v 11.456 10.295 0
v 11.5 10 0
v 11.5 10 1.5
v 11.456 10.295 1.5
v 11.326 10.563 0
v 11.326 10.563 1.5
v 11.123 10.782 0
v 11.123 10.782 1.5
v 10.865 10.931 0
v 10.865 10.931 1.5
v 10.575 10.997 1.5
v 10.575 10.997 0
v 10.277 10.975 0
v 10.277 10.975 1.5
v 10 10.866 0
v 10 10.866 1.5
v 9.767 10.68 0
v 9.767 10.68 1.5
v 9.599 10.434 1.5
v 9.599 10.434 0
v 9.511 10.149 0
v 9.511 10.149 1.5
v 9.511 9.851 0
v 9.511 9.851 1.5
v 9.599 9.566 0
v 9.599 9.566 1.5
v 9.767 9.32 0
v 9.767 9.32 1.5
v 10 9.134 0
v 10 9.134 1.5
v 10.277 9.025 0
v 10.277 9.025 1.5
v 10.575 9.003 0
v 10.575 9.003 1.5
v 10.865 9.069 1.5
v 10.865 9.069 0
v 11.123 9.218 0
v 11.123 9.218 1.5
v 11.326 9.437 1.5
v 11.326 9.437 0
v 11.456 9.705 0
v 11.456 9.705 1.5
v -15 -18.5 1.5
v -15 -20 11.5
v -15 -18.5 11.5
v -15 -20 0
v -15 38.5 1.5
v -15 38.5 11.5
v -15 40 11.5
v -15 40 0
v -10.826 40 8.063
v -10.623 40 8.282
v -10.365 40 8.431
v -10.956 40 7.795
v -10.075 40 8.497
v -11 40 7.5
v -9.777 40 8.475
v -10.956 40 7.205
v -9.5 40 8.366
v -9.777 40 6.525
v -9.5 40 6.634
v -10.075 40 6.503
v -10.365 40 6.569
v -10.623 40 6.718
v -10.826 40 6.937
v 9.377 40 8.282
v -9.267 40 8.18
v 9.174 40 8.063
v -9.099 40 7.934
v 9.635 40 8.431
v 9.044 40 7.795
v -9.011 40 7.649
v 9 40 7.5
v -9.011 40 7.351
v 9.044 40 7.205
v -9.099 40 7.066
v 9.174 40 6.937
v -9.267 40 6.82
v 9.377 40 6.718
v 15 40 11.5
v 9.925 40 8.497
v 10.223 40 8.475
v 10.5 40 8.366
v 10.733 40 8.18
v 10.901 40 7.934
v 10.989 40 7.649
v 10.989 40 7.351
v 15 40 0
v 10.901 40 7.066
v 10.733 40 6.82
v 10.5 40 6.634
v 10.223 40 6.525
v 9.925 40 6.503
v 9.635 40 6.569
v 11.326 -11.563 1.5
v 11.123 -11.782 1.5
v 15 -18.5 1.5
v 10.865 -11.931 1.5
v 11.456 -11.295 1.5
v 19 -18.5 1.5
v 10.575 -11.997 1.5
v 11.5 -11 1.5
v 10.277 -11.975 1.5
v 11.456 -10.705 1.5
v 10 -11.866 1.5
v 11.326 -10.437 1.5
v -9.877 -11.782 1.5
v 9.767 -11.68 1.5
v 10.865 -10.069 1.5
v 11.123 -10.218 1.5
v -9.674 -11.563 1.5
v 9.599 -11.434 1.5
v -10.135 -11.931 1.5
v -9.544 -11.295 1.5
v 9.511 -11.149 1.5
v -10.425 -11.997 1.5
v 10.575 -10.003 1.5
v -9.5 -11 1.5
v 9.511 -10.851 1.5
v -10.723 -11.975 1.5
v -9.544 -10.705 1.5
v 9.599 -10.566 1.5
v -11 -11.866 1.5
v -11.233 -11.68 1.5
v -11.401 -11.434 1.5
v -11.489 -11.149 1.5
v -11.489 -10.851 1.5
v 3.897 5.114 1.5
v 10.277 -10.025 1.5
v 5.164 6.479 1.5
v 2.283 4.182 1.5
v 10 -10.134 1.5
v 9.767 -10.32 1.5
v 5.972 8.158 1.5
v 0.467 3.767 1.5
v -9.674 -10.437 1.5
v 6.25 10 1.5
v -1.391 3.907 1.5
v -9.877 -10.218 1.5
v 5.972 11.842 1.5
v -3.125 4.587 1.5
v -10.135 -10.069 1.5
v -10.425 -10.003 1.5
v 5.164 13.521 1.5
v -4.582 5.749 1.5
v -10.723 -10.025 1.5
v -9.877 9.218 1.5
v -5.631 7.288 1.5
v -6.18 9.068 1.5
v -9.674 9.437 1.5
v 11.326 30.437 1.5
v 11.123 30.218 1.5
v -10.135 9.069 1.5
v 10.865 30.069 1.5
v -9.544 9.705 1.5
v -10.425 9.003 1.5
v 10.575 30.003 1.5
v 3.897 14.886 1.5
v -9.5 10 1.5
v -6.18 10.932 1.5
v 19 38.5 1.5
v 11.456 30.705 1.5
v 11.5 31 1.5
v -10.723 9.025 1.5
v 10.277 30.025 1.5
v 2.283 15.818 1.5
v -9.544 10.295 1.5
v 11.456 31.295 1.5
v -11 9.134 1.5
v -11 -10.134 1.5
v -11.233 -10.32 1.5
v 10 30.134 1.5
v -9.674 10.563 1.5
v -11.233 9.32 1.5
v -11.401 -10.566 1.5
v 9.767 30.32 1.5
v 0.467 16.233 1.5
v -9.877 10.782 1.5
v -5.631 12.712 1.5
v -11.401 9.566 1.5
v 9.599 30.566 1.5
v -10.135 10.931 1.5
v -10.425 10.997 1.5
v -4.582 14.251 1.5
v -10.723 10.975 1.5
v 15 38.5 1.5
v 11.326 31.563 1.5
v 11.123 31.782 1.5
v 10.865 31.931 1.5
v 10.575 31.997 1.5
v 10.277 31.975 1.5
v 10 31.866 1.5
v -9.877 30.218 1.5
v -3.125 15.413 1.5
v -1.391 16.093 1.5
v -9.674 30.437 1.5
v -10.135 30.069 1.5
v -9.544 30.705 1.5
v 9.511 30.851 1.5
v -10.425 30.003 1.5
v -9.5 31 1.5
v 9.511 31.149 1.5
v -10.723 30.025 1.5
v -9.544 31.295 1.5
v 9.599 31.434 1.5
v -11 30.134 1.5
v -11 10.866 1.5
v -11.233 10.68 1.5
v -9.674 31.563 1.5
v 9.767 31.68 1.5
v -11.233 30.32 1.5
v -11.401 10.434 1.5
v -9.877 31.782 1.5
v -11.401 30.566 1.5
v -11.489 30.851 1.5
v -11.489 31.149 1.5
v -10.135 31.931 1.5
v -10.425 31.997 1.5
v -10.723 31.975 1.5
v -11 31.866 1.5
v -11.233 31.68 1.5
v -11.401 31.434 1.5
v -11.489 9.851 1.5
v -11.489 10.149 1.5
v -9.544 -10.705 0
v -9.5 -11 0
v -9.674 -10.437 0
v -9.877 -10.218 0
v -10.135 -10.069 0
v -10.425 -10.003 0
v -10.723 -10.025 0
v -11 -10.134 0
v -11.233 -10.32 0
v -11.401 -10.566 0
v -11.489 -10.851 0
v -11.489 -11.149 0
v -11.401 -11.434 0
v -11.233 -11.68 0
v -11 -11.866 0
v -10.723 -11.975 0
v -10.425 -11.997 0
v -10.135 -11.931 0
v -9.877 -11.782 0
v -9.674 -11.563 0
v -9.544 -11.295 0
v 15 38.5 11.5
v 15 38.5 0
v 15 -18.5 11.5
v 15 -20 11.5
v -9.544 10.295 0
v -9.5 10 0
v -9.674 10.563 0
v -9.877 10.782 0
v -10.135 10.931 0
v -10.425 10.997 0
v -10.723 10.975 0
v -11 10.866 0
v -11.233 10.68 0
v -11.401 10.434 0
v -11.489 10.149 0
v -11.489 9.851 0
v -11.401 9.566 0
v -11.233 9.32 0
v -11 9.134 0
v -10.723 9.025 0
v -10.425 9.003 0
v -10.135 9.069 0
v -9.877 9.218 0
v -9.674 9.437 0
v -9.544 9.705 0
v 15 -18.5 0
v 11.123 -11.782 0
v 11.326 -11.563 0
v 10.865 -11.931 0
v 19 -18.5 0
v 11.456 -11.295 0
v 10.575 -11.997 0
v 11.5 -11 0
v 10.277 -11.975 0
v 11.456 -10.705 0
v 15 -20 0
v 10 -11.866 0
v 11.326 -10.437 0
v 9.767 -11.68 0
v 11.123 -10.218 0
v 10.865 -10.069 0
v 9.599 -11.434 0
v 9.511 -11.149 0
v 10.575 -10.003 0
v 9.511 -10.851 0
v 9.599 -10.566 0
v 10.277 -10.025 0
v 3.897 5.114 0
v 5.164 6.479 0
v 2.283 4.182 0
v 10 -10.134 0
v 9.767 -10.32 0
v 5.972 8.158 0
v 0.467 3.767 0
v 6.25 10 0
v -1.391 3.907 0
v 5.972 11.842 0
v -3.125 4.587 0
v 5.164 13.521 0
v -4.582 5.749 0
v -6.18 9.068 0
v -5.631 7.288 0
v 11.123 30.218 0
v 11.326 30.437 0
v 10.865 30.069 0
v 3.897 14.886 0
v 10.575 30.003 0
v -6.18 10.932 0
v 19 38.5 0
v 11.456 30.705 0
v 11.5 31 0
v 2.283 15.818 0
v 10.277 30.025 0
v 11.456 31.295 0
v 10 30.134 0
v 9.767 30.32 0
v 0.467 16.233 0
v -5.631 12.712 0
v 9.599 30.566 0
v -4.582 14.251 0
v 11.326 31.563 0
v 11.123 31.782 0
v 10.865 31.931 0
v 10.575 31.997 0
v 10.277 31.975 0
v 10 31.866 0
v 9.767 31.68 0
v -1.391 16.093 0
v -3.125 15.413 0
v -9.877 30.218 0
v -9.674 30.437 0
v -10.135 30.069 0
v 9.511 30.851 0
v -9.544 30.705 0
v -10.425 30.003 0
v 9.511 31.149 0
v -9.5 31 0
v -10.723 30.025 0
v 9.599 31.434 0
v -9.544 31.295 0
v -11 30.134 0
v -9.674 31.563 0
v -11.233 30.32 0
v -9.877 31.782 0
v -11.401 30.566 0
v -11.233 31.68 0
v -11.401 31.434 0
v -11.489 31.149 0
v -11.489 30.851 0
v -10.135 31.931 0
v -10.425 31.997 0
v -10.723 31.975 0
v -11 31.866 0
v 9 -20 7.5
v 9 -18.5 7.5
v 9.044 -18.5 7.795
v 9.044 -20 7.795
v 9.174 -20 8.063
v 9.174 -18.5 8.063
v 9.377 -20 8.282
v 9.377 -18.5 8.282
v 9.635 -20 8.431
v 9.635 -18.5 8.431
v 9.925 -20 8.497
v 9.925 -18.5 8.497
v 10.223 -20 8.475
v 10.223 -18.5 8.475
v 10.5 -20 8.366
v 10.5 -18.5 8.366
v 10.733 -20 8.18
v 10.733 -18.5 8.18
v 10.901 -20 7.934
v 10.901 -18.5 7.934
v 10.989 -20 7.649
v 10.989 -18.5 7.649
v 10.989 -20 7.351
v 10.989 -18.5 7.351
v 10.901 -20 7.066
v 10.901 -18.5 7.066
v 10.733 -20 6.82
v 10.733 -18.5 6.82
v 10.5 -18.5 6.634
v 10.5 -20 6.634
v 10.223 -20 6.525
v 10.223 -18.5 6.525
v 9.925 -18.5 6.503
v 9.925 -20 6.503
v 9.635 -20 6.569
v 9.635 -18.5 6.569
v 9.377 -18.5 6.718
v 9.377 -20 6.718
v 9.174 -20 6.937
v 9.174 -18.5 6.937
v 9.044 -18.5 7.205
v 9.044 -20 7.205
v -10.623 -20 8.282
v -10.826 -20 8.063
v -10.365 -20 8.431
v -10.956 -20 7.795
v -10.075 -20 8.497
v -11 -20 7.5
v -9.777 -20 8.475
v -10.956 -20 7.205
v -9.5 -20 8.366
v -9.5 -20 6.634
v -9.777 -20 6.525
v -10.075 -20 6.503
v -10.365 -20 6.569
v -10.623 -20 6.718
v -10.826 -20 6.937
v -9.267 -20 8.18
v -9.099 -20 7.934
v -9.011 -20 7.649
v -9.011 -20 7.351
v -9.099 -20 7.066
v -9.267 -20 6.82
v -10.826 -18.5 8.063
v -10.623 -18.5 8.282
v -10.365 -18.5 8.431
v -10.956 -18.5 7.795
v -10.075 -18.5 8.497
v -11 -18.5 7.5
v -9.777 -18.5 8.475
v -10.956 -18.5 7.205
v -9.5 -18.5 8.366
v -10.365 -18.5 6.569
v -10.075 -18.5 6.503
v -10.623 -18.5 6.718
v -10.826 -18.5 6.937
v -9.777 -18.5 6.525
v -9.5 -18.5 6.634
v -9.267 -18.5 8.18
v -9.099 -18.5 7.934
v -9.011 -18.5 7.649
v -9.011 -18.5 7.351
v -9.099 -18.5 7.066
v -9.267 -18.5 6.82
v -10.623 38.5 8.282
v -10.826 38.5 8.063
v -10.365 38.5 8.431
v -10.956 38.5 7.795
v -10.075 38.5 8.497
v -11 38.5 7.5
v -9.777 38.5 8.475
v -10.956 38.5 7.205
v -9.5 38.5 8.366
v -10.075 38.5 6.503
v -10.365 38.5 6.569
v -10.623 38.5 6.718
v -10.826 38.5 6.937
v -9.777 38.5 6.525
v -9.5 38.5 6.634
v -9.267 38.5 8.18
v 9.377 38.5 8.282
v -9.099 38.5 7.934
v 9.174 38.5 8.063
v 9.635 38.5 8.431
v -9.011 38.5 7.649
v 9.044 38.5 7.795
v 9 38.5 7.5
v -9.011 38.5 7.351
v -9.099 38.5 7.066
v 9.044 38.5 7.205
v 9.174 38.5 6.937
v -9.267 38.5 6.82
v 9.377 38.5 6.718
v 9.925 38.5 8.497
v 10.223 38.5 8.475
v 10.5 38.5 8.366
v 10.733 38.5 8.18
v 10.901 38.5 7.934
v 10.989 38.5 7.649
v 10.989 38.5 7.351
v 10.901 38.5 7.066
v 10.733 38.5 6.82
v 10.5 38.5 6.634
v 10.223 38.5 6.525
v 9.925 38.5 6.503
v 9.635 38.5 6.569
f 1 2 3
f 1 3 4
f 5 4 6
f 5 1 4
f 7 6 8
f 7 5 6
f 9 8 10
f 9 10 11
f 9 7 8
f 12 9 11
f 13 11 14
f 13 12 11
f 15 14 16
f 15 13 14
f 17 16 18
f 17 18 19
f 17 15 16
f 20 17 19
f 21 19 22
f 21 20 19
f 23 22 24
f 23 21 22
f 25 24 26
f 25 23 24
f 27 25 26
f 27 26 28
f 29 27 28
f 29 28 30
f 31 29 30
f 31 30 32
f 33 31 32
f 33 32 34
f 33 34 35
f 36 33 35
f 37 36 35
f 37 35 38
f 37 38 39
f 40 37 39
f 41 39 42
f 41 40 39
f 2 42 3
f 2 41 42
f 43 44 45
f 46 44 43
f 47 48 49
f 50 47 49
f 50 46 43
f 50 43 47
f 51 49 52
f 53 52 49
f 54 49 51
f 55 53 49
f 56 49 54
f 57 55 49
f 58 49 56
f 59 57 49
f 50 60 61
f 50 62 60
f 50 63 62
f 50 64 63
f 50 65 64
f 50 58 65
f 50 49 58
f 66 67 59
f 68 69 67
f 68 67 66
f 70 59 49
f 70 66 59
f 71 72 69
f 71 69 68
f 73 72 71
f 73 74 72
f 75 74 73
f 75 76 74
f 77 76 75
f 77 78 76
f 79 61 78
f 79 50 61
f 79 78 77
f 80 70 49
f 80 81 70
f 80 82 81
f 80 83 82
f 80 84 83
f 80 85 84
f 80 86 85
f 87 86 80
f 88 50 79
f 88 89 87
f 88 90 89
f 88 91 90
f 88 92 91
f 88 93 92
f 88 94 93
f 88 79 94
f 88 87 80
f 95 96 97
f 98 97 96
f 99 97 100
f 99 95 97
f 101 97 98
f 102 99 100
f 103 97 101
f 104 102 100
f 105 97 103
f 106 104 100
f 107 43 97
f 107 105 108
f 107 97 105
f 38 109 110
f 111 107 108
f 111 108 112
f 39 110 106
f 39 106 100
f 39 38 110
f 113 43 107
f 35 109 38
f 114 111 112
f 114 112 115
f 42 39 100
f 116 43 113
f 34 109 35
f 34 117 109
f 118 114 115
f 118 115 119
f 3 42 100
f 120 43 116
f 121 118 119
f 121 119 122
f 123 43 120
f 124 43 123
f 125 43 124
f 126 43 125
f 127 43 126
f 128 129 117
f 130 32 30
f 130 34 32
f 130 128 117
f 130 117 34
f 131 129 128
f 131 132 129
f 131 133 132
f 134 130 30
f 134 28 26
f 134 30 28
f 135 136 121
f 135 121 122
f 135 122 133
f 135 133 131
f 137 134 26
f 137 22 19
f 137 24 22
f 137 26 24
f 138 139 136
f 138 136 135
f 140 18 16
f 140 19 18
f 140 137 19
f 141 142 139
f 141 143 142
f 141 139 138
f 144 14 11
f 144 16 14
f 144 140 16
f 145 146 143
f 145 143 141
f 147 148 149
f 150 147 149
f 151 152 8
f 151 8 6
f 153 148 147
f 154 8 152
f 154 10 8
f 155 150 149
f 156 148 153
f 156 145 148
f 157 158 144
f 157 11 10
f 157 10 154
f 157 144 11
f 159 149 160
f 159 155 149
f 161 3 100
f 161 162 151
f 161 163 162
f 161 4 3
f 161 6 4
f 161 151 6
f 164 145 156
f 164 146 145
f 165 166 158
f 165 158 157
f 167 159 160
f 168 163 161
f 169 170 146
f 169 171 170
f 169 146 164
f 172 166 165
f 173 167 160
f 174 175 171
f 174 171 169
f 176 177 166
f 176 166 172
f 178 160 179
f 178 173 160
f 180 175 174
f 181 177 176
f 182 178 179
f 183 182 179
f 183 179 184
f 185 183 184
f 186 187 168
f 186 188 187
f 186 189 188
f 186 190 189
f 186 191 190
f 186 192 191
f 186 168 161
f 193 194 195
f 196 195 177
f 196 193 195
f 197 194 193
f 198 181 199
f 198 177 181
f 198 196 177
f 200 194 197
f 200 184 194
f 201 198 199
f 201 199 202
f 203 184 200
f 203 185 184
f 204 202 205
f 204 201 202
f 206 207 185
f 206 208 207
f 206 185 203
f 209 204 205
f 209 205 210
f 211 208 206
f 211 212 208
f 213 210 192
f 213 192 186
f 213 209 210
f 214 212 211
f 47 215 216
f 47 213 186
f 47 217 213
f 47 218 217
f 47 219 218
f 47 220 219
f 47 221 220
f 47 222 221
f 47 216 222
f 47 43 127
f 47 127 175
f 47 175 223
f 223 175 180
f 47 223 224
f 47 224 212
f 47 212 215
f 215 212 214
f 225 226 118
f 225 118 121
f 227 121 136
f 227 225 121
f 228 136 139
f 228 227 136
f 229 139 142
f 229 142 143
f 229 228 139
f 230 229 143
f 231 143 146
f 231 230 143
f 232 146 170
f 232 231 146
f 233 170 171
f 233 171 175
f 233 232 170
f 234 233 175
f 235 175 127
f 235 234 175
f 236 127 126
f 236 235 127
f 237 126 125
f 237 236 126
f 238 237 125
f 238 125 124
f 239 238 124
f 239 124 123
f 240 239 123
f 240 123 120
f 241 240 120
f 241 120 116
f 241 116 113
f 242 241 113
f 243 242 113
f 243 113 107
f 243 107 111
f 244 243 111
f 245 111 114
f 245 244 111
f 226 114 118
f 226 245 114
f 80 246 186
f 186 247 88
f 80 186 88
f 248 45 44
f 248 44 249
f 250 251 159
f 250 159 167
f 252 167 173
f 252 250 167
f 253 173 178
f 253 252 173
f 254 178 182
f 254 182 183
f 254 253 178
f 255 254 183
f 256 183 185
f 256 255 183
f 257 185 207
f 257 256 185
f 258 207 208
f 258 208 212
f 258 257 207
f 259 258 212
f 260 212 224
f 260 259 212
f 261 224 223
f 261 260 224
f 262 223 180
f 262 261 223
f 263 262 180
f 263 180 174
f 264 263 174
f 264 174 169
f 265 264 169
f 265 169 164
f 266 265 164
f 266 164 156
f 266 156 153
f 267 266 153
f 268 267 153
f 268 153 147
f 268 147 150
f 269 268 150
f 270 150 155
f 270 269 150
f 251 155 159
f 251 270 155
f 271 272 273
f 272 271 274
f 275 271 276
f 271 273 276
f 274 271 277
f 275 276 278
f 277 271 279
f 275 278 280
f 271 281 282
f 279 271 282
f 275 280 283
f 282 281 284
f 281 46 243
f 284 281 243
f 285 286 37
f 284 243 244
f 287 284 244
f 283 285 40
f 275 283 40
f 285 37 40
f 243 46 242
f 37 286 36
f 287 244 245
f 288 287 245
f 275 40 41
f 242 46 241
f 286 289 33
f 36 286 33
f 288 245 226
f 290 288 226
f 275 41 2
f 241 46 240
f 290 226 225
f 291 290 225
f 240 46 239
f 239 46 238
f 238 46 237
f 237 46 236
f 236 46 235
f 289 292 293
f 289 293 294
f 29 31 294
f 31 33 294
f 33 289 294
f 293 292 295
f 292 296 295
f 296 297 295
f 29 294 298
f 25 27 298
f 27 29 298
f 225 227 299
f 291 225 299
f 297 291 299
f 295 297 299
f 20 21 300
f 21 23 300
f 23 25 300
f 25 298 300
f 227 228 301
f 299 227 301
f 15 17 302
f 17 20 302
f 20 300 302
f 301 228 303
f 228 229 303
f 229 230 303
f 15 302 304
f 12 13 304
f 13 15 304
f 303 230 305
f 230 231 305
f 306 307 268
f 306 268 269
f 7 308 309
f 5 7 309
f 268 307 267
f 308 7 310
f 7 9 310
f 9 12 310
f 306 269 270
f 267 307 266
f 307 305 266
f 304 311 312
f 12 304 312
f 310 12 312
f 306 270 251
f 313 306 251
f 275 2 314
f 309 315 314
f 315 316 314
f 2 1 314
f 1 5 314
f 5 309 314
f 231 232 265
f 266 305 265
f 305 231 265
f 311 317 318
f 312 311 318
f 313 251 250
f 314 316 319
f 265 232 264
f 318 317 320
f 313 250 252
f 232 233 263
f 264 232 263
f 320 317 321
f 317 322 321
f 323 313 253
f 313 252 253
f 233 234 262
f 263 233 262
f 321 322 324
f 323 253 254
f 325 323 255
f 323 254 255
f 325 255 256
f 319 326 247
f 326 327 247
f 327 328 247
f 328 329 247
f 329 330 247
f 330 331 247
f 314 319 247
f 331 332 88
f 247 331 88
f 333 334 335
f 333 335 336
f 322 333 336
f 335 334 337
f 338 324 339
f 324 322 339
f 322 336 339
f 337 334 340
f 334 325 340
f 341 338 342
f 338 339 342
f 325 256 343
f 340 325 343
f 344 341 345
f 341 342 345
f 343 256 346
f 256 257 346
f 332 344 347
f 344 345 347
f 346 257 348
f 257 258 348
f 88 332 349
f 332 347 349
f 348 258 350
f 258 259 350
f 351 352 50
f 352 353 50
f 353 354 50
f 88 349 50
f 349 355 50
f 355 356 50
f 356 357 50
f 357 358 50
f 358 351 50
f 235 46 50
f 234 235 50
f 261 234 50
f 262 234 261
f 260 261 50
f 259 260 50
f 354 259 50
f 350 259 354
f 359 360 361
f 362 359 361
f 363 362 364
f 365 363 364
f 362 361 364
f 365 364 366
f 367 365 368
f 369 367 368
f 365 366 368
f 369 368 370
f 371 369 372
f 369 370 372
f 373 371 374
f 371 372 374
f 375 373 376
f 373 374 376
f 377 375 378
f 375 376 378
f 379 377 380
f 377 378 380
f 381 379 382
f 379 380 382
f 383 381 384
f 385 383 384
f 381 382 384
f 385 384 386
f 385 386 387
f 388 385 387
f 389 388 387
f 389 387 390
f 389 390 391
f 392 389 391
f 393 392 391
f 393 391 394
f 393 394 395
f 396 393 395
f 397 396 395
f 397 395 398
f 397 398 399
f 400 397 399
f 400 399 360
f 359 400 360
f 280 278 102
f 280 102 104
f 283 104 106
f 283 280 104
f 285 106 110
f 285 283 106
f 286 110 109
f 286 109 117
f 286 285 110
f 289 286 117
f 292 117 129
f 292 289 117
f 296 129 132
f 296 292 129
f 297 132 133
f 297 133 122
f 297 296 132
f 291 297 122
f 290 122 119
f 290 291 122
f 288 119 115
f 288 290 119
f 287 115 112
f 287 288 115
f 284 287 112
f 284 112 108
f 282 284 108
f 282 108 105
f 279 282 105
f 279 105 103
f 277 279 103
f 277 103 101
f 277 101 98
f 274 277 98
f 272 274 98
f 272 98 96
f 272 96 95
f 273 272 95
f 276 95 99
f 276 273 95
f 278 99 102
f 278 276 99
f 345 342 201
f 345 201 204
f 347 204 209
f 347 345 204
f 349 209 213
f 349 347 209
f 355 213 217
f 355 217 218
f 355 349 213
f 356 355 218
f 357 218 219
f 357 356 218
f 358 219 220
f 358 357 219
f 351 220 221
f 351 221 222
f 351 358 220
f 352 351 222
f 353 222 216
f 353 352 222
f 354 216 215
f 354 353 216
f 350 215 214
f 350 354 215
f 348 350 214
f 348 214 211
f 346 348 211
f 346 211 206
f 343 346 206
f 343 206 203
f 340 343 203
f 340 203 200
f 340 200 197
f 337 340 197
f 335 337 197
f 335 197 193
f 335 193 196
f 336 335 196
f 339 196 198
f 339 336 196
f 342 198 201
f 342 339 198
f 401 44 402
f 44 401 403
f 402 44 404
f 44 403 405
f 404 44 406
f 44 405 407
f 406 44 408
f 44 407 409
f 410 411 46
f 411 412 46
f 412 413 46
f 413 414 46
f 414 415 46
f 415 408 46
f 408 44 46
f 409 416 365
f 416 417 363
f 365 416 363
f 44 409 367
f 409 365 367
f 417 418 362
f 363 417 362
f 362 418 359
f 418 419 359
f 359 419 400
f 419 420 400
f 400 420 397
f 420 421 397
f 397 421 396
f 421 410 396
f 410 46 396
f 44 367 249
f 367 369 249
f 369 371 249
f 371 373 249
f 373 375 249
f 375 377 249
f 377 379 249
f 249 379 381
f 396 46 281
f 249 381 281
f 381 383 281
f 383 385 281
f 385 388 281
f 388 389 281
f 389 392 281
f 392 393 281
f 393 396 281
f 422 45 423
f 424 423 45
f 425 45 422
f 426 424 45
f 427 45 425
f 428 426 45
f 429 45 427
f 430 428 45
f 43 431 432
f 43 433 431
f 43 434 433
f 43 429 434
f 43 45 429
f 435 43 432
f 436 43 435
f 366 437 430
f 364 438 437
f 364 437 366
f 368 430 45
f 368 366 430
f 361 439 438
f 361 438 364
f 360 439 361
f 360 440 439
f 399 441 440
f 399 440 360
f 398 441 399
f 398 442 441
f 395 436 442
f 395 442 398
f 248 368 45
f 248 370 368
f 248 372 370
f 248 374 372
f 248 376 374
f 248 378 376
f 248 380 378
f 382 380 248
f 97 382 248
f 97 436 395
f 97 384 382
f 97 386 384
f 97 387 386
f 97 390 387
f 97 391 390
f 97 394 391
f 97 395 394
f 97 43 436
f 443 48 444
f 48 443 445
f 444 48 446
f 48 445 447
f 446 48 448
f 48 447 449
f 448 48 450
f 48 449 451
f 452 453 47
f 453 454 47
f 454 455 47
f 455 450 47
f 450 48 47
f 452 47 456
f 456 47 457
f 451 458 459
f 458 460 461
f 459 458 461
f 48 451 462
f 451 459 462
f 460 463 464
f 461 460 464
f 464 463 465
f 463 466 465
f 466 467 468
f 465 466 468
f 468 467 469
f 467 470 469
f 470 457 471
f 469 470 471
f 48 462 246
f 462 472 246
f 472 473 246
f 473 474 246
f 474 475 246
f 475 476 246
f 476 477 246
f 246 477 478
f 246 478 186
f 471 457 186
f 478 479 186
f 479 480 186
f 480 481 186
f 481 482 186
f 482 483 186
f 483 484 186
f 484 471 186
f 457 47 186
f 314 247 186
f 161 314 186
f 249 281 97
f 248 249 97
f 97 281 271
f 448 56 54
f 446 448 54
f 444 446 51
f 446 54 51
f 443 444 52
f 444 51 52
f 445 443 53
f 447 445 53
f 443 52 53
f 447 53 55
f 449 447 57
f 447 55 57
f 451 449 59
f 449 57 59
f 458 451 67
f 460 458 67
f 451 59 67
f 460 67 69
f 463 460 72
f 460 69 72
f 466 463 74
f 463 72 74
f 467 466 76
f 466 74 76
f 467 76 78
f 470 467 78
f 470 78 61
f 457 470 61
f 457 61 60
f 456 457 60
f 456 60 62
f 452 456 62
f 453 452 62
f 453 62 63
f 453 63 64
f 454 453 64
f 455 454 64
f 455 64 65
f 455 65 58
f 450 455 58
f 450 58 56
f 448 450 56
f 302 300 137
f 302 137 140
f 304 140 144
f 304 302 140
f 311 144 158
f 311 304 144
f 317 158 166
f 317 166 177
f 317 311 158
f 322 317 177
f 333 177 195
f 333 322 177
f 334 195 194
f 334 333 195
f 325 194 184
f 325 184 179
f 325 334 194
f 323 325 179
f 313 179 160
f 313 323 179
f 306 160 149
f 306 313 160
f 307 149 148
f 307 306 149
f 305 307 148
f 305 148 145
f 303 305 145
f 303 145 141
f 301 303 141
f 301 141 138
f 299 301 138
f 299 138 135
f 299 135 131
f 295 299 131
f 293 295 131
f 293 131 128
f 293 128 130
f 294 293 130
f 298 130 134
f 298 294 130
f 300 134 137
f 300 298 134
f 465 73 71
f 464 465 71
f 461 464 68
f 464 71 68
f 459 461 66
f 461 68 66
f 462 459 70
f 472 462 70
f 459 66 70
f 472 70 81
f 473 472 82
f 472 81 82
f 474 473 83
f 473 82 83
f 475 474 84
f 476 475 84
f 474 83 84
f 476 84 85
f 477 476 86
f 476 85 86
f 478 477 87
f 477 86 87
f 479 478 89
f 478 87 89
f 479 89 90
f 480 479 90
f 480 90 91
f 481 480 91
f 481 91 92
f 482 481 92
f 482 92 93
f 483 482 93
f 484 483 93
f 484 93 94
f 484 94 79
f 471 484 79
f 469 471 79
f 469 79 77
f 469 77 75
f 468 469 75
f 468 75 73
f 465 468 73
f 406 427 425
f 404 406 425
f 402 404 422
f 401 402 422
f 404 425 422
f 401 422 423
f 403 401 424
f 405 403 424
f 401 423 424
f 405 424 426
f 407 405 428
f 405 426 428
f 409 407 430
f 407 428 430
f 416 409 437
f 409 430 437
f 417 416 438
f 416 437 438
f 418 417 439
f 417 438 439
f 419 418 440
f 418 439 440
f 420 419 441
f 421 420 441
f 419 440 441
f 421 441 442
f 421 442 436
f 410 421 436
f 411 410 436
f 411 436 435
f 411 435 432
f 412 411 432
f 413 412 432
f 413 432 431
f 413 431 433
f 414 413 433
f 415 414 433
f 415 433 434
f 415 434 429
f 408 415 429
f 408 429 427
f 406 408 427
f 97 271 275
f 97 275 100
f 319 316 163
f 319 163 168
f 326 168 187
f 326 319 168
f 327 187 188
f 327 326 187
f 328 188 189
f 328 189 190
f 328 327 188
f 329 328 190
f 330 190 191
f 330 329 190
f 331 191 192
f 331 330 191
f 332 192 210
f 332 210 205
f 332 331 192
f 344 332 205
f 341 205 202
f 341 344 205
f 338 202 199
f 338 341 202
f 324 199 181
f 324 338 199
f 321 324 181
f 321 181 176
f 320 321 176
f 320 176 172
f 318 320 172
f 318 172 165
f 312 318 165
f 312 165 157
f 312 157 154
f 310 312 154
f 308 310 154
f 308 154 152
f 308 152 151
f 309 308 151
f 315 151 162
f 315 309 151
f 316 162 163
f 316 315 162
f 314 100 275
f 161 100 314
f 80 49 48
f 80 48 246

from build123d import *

# Parameters (mm, degrees)
F0_W     = 30
F0_H     = 60
F0_R     = 1
F0_R_2   = 6.25
F1_DEPTH = 1.5
F2_W     = 30
F2_H     = 1.5
F3_DEPTH = 10
F4_R     = 1
F5_DEPTH = 60.001
F6_W     = 57
F6_H     = 1.5
F7_DEPTH = 4


with BuildPart() as f1:
    # F0 (on Top) → F1 (new body)
    with BuildSketch(Plane.XY):
        with Locations((0, 10)):
            Rectangle(F0_W, F0_H)
        with Locations((-10.5, -11)):
            Circle(F0_R, mode=Mode.SUBTRACT)
        with Locations((10.5, -11)):
            Circle(F0_R, mode=Mode.SUBTRACT)
        with Locations((-10.5, 10)):
            Circle(F0_R, mode=Mode.SUBTRACT)
        with Locations((-10.5, 31)):
            Circle(F0_R, mode=Mode.SUBTRACT)
        with Locations((0, 10)):
            Circle(F0_R_2, mode=Mode.SUBTRACT)
        with Locations((10.5, 10)):
            Circle(F0_R, mode=Mode.SUBTRACT)
        with Locations((10.5, 31)):
            Circle(F0_R, mode=Mode.SUBTRACT)
    extrude(amount=F1_DEPTH)

    # F2 (on face) → F3 (join)
    with BuildSketch(Plane.XY.offset(1.5)):
        with Locations((0, 39.25)):
            Rectangle(F2_W, F2_H)
        with Locations((0, -19.25)):
            Rectangle(F2_W, F2_H)
    extrude(amount=F3_DEPTH)

    # F4 (on face) → F5 (cut, through all)
    with BuildSketch(Plane(origin=(0, 40, 0), x_dir=(-1, 0, 0), z_dir=(0, 1, 0))):
        with Locations((-10, 7.5)):
            Circle(F4_R)
        with Locations((10, 7.5)):
            Circle(F4_R)
    extrude(amount=-F5_DEPTH, mode=Mode.SUBTRACT)

    # F6 (on face) → F7 (join)
    with BuildSketch(Plane.YZ.offset(15)):
        with Locations((10, 0.75)):
            Rectangle(F6_W, F6_H)
    extrude(amount=F7_DEPTH)


solid = f1.part
